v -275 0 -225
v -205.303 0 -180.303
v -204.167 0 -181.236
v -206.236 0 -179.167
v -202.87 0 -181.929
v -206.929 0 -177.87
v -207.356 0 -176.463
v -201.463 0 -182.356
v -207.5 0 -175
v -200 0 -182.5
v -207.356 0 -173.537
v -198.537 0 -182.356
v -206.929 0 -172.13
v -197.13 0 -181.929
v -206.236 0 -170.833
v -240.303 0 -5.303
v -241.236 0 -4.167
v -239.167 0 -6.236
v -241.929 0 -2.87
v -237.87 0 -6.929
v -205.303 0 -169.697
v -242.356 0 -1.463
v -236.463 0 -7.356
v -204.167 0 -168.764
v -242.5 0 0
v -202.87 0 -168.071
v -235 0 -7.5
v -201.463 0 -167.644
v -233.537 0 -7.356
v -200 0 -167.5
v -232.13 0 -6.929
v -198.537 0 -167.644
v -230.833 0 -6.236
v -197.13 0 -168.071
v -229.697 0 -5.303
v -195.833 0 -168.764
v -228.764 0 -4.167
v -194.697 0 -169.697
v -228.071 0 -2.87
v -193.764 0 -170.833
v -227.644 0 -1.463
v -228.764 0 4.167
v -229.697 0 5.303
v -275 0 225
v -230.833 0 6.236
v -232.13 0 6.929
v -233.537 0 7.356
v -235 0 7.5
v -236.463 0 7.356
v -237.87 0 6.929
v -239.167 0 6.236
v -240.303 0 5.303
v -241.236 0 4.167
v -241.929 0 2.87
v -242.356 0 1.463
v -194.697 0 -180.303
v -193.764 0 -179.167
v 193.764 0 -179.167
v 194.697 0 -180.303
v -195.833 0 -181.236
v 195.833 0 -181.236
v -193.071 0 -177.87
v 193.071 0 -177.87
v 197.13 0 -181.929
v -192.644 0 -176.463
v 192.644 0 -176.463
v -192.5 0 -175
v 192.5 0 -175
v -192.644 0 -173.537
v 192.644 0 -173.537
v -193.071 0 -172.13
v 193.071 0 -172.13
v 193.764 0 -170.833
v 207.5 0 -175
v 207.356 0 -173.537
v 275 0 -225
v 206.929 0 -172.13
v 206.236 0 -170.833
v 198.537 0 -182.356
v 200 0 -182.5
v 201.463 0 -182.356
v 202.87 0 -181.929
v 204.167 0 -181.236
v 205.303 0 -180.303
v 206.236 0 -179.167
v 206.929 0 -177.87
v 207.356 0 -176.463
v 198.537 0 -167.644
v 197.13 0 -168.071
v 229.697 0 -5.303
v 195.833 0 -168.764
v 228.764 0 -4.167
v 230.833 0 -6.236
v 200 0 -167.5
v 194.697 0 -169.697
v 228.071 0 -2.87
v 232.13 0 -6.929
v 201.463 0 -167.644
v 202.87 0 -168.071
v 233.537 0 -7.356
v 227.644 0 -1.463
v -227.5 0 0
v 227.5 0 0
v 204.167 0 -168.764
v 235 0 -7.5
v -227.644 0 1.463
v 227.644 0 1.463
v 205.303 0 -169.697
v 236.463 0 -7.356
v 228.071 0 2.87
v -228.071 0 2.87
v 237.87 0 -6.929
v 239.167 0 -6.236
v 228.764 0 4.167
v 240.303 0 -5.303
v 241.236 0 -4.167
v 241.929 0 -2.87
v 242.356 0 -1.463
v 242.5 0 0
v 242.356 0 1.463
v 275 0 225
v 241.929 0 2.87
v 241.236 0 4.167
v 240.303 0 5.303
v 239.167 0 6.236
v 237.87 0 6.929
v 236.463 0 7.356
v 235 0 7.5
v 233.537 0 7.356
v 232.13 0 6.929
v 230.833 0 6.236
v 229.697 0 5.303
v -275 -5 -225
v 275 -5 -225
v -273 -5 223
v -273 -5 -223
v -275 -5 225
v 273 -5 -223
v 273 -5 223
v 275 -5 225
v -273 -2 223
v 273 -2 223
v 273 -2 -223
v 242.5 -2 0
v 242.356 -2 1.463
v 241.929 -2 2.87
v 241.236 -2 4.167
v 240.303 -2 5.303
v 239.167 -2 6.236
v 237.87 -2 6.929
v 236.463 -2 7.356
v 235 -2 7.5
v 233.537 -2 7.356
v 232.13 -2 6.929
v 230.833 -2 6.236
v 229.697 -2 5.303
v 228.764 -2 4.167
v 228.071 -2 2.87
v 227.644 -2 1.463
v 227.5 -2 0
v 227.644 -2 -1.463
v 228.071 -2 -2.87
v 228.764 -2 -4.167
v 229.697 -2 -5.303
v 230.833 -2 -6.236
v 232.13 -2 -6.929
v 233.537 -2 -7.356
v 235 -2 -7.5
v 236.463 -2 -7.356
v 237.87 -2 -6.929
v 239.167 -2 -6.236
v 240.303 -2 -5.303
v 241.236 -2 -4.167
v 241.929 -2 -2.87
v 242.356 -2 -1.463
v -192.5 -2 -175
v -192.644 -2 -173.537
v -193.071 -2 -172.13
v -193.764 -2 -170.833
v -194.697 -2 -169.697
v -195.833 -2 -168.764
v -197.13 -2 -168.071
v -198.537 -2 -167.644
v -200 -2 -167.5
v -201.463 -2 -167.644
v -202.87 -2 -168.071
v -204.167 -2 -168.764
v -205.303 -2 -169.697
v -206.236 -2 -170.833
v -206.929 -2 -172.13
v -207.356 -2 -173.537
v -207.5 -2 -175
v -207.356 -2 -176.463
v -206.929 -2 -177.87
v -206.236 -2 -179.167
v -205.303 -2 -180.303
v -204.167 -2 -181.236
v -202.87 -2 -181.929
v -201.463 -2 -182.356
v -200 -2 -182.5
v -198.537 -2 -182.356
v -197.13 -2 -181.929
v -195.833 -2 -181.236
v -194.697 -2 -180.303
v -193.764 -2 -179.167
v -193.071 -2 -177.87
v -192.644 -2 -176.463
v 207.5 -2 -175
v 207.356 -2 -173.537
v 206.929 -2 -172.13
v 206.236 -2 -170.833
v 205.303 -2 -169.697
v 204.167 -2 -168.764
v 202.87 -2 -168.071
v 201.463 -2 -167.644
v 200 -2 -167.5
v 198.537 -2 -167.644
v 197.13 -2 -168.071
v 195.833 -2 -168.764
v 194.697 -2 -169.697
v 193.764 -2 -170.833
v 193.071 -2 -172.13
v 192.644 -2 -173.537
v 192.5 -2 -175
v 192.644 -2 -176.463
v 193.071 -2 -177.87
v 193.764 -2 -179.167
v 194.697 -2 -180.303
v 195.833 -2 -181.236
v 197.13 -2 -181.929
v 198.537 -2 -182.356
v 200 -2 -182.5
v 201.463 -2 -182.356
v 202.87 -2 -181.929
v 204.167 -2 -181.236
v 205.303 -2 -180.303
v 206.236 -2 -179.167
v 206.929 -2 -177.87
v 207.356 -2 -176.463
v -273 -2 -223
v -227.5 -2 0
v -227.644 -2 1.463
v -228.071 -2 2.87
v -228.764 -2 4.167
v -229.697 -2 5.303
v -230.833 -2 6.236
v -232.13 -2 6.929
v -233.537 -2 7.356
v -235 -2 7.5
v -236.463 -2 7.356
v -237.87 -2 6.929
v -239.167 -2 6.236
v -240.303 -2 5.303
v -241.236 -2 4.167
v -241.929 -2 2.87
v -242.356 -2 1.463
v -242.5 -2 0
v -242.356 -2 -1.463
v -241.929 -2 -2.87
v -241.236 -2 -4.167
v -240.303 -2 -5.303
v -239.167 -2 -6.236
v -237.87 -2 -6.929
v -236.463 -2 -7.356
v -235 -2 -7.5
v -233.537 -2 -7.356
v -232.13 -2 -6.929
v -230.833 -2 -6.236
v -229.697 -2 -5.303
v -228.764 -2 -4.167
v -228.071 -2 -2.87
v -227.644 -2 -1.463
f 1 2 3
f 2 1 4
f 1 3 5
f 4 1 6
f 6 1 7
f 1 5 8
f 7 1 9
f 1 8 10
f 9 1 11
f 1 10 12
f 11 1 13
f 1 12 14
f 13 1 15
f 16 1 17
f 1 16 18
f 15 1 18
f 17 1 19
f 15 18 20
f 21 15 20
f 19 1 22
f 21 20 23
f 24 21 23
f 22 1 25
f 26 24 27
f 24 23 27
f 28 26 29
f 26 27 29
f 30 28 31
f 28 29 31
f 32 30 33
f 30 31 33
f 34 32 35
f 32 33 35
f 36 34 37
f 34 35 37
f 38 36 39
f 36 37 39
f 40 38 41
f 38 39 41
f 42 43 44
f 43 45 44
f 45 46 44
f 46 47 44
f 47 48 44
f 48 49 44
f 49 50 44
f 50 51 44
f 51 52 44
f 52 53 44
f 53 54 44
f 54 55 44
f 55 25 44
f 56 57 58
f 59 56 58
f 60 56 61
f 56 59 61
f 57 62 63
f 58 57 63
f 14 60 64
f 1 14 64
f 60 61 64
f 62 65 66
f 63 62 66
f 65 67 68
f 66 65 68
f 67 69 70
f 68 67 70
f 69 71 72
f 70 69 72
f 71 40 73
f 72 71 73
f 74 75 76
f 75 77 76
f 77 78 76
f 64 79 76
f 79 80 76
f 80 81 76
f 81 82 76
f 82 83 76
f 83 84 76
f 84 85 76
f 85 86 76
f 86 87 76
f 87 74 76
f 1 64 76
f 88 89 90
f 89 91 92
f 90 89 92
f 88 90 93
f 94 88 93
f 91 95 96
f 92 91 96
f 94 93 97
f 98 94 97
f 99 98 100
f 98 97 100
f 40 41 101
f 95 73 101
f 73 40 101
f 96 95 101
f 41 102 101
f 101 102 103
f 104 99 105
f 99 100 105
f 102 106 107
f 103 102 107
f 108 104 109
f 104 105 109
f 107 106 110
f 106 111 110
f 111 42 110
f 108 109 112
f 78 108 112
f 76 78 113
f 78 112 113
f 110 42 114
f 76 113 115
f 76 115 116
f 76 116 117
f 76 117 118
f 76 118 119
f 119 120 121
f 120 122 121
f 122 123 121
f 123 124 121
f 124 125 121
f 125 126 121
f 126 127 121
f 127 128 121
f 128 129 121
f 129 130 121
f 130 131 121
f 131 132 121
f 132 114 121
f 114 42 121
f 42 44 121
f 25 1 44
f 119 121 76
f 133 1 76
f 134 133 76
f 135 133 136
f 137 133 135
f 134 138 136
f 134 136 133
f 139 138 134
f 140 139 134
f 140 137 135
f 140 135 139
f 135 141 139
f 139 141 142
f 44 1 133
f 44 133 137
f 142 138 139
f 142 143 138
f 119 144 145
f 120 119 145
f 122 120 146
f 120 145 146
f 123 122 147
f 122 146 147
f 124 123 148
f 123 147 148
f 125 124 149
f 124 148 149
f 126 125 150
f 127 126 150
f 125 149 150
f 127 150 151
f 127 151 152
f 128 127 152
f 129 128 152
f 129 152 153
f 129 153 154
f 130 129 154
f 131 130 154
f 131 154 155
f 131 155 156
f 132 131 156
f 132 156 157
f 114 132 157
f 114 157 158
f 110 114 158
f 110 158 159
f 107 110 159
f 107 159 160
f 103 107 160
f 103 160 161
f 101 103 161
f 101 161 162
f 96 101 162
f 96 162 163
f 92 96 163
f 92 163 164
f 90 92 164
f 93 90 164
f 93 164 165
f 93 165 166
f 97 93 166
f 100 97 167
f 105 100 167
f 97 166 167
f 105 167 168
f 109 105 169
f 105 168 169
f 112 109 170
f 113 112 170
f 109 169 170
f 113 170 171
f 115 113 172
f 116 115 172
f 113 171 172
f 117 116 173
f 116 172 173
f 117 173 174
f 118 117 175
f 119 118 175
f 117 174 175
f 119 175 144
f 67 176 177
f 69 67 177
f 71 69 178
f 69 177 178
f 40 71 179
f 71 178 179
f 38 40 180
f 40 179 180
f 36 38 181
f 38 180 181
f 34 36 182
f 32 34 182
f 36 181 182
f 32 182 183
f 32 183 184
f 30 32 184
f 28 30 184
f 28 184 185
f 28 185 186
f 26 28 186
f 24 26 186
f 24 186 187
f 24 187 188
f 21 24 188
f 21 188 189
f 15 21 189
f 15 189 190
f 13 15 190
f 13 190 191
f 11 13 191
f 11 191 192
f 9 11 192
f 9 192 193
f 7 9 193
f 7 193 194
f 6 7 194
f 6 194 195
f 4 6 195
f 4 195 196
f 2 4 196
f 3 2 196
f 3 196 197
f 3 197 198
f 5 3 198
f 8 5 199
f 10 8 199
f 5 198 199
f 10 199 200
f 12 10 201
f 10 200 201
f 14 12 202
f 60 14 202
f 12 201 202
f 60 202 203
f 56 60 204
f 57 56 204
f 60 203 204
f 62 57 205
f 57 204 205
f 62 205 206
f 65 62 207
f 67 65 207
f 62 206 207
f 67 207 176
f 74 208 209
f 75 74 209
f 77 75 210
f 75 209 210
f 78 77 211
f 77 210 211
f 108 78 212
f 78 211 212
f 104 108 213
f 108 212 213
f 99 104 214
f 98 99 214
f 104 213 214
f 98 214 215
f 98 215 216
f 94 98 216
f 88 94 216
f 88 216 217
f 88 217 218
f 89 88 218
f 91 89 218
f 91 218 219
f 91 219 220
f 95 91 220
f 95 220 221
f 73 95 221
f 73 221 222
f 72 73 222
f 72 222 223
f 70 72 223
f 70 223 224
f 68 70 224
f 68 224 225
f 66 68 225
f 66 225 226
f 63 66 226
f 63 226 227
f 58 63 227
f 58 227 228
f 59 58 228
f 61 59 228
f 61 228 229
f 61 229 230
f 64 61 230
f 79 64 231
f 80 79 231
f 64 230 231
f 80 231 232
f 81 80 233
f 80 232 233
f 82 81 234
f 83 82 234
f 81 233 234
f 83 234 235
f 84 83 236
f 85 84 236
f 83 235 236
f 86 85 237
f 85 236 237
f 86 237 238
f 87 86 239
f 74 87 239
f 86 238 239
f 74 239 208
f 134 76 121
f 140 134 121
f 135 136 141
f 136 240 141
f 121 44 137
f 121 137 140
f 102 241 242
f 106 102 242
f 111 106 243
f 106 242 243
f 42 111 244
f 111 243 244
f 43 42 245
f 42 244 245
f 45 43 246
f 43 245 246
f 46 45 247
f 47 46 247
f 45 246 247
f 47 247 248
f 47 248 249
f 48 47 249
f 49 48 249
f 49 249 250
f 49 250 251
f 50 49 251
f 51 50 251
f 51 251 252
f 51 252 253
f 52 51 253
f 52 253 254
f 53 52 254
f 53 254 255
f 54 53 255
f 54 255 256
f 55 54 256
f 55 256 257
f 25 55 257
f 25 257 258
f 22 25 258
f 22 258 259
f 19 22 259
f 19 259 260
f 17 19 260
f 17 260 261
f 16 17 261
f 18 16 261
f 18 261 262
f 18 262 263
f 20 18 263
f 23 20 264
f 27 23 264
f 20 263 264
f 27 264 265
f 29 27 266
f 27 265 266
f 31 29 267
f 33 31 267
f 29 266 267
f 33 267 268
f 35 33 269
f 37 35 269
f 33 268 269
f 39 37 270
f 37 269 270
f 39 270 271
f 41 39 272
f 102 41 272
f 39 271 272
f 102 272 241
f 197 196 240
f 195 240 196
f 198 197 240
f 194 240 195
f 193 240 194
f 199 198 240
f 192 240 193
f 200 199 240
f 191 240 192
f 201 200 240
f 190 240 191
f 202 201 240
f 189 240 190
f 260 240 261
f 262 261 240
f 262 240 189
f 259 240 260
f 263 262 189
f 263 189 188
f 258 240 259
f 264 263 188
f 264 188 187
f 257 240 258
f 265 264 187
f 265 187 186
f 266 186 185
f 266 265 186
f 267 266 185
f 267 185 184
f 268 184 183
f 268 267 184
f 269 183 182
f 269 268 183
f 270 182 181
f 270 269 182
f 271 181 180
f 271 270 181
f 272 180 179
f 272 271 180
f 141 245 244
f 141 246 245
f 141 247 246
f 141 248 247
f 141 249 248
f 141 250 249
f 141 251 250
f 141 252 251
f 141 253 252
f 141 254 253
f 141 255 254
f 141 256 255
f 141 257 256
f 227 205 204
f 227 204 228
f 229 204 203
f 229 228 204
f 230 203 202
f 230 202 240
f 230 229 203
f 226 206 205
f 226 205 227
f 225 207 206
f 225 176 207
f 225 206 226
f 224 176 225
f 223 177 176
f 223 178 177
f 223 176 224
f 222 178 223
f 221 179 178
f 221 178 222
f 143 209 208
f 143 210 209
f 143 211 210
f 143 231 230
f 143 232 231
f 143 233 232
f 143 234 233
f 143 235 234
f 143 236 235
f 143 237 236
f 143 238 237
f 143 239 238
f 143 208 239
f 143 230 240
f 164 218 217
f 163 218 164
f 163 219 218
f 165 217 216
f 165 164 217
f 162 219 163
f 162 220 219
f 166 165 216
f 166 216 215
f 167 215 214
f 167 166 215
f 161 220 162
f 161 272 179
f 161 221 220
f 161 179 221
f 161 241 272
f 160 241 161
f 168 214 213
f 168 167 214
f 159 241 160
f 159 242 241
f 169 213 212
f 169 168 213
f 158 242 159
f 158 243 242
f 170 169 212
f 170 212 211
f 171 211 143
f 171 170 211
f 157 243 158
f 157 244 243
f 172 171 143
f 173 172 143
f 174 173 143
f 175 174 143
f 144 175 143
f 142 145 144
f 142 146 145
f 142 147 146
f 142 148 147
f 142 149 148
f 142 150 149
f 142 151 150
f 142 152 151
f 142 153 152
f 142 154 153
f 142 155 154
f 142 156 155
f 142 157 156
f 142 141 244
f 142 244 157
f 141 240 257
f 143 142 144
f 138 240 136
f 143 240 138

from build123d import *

# Parameters (mm, degrees)
F0_W     = 550
F0_H     = 450
F1_DEPTH = 5
F2_T     = -2
F4_D     = 15


with BuildPart() as f1:
    # F0 (on Front) → F1 (new body)
    with BuildSketch(Plane.XZ):
        Rectangle(F0_W, F0_H)
    extrude(amount=F1_DEPTH)

    # F2
    f2_openings = [f1.faces().sort_by_distance(p)[0] for p in [
        (0, -5, 0),
    ]]
    offset(amount=F2_T, openings=f2_openings)

    # F4 (through all)
    with Locations(Plane(origin=(0, 0, 0), x_dir=(-1, 0, 0), z_dir=(0, 1, 0))):
        with Locations((235, 0), (-235, 0), (-200, -175), (200, -175)):
            Hole(F4_D / 2)


solid = f1.part
